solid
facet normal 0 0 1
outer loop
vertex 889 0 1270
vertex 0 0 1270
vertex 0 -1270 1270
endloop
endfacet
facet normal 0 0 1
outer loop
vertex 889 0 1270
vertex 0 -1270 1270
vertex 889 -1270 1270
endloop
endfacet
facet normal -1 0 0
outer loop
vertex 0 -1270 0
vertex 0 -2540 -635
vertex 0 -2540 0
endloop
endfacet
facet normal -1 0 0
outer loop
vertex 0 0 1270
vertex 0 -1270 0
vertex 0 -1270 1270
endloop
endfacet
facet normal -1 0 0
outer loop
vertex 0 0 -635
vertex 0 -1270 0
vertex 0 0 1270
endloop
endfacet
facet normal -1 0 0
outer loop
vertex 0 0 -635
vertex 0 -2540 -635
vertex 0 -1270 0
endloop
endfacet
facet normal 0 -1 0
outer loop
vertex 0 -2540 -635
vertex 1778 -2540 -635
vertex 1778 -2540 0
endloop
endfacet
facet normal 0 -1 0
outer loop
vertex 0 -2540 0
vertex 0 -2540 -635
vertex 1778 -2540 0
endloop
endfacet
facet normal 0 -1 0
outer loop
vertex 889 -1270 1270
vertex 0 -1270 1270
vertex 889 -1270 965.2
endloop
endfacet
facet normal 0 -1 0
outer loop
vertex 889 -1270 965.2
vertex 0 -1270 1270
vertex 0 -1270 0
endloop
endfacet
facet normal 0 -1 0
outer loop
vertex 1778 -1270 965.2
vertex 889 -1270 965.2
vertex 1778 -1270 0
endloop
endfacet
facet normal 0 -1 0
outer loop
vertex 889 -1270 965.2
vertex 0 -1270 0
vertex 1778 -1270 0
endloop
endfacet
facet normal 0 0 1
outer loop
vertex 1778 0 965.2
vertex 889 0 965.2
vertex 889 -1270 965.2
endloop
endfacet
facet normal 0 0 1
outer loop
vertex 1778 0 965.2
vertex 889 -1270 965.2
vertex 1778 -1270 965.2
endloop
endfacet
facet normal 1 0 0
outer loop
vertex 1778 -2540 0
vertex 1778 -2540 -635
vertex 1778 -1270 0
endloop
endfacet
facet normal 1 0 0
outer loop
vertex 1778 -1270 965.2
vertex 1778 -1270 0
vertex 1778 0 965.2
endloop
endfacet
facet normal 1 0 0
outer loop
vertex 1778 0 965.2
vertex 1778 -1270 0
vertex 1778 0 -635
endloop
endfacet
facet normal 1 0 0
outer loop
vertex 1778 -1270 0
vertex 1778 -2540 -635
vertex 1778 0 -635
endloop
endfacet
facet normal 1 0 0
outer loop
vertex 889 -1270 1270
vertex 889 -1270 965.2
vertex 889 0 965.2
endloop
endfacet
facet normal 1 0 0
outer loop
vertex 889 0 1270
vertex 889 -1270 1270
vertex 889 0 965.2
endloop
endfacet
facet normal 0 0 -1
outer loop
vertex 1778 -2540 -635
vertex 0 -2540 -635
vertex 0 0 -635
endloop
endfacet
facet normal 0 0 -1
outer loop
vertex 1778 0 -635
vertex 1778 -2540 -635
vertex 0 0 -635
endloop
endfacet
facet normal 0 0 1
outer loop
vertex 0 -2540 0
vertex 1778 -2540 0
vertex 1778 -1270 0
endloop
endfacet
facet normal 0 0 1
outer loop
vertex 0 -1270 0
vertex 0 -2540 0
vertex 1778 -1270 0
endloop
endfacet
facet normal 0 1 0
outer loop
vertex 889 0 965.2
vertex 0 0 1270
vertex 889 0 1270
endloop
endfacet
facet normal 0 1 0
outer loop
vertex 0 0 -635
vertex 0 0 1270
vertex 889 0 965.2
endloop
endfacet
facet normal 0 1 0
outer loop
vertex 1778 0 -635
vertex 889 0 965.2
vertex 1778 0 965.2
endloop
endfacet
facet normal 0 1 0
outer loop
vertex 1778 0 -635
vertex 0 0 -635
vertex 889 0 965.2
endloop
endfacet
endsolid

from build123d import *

# Parameters (mm, degrees)
F0_W     = 2540
F0_H     = 635
F1_DEPTH = 1778
F2_W     = 889
F2_H     = 1270
F3_DEPTH = 1270
F4_W     = 889
F4_H     = 1270
F5_DEPTH = 965.2


with BuildPart() as f1:
    # F0 (on Right) → F1 (new body)
    with BuildSketch(Plane.YZ):
        with Locations((-1270, -317.5)):
            Rectangle(F0_W, F0_H)
    extrude(amount=F1_DEPTH)

    # F2 (on face) → F3 (join)
    with BuildSketch(Plane.XY):
        with Locations((444.5, -635)):
            Rectangle(F2_W, F2_H)
    extrude(amount=F3_DEPTH)

    # F4 (on face) → F5 (join)
    with BuildSketch(Plane.XY):
        with Locations((1333.5, -635)):
            Rectangle(F4_W, F4_H)
    extrude(amount=F5_DEPTH)


solid = f1.part
